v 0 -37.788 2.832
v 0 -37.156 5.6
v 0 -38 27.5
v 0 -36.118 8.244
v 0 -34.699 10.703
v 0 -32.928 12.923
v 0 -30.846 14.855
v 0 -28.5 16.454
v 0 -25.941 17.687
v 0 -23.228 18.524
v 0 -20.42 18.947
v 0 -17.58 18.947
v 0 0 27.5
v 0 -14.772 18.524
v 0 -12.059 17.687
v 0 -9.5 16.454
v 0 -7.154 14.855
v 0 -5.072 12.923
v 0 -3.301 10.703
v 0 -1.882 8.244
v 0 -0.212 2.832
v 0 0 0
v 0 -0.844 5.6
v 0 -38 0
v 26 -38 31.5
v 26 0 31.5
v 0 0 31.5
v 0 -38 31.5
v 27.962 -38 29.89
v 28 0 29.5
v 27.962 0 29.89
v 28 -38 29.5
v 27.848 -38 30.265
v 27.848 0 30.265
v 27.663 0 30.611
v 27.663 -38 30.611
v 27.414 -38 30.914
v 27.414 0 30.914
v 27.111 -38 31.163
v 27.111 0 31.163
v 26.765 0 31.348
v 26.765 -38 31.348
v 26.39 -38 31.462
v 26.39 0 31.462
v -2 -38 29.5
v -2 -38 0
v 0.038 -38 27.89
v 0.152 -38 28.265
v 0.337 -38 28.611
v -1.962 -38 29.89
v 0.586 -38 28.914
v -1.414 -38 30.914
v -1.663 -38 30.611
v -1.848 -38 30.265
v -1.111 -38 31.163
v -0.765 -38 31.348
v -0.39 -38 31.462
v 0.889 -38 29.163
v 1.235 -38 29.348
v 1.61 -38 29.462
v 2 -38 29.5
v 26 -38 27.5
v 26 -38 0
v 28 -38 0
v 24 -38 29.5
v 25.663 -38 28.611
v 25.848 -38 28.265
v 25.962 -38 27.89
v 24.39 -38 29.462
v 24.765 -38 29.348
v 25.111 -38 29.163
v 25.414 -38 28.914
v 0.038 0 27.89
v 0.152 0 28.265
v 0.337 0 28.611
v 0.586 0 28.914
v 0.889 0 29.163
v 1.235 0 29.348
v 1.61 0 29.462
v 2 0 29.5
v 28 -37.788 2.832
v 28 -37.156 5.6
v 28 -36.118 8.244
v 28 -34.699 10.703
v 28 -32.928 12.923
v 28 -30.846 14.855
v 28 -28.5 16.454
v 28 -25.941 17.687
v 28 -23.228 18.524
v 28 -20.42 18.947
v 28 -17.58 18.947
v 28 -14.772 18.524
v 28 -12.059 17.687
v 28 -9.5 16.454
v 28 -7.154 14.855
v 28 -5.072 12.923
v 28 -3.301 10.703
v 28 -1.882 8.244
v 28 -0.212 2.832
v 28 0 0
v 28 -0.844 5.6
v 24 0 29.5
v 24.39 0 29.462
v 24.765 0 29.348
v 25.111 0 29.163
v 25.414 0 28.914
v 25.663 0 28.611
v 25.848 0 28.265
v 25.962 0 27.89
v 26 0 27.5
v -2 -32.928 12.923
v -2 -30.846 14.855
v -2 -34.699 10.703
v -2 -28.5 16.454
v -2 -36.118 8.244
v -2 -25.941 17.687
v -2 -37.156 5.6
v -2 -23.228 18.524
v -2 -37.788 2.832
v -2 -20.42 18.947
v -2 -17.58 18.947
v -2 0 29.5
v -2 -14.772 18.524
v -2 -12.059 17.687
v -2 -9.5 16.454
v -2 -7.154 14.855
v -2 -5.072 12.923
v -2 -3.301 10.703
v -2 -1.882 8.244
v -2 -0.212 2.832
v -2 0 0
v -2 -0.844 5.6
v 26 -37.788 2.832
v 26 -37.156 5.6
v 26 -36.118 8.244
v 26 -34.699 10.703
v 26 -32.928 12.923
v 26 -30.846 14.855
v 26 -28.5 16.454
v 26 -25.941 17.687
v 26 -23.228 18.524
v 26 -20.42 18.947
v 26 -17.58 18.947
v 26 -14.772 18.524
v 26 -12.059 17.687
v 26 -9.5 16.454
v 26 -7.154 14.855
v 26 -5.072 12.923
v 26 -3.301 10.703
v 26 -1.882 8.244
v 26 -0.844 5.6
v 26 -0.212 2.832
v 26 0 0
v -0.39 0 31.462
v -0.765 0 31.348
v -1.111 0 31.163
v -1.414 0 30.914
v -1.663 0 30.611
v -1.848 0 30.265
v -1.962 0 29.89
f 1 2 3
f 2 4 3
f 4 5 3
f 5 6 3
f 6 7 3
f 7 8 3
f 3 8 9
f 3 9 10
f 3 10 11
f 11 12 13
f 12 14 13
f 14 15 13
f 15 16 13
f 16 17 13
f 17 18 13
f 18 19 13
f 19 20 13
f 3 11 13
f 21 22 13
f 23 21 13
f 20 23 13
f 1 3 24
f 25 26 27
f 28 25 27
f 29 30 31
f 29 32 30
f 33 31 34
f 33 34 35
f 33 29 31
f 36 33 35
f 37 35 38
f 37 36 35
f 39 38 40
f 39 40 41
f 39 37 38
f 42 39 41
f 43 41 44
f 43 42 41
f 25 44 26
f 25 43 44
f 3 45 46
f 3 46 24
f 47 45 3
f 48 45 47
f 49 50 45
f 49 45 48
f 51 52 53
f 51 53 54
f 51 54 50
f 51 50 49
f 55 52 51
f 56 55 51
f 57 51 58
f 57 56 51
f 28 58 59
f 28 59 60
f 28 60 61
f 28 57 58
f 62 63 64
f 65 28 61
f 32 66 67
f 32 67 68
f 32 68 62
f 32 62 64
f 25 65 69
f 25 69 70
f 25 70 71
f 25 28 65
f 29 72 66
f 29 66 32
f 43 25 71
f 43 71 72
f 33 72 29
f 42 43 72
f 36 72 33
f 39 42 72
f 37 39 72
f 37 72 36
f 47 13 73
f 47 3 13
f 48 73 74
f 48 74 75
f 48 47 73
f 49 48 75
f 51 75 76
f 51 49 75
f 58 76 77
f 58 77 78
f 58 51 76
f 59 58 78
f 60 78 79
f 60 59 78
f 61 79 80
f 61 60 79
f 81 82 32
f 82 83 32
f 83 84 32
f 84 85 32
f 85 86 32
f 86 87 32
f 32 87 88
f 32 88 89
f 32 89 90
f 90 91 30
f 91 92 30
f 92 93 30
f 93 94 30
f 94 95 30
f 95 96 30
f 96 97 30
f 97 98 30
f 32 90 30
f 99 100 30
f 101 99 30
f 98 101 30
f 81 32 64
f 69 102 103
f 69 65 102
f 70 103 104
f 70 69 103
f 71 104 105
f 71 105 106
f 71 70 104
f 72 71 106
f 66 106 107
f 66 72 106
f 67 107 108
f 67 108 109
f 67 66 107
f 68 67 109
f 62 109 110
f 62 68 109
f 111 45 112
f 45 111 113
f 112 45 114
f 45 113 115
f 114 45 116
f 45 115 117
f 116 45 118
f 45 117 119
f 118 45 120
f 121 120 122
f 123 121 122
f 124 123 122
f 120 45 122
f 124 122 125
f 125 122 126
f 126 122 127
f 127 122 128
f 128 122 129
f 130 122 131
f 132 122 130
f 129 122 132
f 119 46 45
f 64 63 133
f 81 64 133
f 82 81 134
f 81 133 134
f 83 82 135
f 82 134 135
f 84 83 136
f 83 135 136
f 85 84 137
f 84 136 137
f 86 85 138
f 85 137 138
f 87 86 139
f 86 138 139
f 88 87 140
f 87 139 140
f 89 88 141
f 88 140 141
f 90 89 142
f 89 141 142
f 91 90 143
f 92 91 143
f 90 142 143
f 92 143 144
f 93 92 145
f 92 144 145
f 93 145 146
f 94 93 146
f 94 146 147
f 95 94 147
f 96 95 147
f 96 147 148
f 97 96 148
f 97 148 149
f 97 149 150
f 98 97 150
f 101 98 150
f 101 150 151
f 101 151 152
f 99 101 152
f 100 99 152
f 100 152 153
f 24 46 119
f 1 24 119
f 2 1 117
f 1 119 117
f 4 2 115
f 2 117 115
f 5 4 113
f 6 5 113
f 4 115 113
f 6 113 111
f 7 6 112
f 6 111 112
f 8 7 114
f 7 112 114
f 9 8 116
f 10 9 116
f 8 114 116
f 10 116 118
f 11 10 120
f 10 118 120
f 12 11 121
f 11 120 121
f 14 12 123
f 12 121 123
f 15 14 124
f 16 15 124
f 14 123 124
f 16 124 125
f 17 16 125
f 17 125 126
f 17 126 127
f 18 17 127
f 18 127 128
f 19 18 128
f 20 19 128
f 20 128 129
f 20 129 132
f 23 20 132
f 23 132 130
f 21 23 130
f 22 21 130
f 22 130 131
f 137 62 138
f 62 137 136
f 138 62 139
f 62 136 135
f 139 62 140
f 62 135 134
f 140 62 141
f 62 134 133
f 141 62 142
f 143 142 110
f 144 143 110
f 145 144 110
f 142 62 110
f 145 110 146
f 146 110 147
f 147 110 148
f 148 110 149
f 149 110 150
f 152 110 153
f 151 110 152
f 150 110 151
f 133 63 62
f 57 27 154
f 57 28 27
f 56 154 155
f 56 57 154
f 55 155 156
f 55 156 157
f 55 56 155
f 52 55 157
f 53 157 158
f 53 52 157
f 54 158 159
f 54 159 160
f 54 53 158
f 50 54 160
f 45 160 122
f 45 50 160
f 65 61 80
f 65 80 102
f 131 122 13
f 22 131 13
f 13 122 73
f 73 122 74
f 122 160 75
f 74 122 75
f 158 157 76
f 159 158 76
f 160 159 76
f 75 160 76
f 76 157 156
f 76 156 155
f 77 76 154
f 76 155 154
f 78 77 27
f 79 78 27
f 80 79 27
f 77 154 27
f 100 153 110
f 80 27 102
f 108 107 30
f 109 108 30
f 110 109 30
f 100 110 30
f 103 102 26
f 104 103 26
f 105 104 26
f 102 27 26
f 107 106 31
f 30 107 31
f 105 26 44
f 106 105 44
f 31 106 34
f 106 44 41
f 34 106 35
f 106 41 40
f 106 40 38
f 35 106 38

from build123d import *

# Parameters (mm, degrees)
F1_DEPTH = 38
F3_DEPTH = 30.001
F4_R     = 2


with BuildPart() as f1:
    # F0 (on Front) → F1 (new body)
    with BuildSketch(Plane.XZ):
        Polygon((-2, 0), (0, 0), (0, 29.5), (26, 29.5), (26, 0), (28, 0), (28, 31.5), (-2, 31.5), align=None)
    extrude(amount=F1_DEPTH)

    # F2 (on face) → F3 (cut, through all)
    with BuildSketch(Plane(origin=(-2, 0, 0), x_dir=(0, -1, 0), z_dir=(-1, 0, 0))):
        with BuildLine():
            ThreePointArc((0, 0), (19, -19), (38, 0))
            Line((38, 0), (0, 0))
        make_face()
        with BuildLine():
            Line((0, 0), (38, 0))
            ThreePointArc((38, 0), (19, 19), (0, 0))
        make_face()
    extrude(amount=-F3_DEPTH, mode=Mode.SUBTRACT)

    # F4
    f4_edges = [f1.edges().sort_by_distance(p)[0] for p in [
        (26, -19, 29.5),
        (0, -19, 29.5),
        (28, -19, 31.5),
        (-2, -19, 31.5),
    ]]
    fillet(f4_edges, radius=F4_R)


solid = f1.part
